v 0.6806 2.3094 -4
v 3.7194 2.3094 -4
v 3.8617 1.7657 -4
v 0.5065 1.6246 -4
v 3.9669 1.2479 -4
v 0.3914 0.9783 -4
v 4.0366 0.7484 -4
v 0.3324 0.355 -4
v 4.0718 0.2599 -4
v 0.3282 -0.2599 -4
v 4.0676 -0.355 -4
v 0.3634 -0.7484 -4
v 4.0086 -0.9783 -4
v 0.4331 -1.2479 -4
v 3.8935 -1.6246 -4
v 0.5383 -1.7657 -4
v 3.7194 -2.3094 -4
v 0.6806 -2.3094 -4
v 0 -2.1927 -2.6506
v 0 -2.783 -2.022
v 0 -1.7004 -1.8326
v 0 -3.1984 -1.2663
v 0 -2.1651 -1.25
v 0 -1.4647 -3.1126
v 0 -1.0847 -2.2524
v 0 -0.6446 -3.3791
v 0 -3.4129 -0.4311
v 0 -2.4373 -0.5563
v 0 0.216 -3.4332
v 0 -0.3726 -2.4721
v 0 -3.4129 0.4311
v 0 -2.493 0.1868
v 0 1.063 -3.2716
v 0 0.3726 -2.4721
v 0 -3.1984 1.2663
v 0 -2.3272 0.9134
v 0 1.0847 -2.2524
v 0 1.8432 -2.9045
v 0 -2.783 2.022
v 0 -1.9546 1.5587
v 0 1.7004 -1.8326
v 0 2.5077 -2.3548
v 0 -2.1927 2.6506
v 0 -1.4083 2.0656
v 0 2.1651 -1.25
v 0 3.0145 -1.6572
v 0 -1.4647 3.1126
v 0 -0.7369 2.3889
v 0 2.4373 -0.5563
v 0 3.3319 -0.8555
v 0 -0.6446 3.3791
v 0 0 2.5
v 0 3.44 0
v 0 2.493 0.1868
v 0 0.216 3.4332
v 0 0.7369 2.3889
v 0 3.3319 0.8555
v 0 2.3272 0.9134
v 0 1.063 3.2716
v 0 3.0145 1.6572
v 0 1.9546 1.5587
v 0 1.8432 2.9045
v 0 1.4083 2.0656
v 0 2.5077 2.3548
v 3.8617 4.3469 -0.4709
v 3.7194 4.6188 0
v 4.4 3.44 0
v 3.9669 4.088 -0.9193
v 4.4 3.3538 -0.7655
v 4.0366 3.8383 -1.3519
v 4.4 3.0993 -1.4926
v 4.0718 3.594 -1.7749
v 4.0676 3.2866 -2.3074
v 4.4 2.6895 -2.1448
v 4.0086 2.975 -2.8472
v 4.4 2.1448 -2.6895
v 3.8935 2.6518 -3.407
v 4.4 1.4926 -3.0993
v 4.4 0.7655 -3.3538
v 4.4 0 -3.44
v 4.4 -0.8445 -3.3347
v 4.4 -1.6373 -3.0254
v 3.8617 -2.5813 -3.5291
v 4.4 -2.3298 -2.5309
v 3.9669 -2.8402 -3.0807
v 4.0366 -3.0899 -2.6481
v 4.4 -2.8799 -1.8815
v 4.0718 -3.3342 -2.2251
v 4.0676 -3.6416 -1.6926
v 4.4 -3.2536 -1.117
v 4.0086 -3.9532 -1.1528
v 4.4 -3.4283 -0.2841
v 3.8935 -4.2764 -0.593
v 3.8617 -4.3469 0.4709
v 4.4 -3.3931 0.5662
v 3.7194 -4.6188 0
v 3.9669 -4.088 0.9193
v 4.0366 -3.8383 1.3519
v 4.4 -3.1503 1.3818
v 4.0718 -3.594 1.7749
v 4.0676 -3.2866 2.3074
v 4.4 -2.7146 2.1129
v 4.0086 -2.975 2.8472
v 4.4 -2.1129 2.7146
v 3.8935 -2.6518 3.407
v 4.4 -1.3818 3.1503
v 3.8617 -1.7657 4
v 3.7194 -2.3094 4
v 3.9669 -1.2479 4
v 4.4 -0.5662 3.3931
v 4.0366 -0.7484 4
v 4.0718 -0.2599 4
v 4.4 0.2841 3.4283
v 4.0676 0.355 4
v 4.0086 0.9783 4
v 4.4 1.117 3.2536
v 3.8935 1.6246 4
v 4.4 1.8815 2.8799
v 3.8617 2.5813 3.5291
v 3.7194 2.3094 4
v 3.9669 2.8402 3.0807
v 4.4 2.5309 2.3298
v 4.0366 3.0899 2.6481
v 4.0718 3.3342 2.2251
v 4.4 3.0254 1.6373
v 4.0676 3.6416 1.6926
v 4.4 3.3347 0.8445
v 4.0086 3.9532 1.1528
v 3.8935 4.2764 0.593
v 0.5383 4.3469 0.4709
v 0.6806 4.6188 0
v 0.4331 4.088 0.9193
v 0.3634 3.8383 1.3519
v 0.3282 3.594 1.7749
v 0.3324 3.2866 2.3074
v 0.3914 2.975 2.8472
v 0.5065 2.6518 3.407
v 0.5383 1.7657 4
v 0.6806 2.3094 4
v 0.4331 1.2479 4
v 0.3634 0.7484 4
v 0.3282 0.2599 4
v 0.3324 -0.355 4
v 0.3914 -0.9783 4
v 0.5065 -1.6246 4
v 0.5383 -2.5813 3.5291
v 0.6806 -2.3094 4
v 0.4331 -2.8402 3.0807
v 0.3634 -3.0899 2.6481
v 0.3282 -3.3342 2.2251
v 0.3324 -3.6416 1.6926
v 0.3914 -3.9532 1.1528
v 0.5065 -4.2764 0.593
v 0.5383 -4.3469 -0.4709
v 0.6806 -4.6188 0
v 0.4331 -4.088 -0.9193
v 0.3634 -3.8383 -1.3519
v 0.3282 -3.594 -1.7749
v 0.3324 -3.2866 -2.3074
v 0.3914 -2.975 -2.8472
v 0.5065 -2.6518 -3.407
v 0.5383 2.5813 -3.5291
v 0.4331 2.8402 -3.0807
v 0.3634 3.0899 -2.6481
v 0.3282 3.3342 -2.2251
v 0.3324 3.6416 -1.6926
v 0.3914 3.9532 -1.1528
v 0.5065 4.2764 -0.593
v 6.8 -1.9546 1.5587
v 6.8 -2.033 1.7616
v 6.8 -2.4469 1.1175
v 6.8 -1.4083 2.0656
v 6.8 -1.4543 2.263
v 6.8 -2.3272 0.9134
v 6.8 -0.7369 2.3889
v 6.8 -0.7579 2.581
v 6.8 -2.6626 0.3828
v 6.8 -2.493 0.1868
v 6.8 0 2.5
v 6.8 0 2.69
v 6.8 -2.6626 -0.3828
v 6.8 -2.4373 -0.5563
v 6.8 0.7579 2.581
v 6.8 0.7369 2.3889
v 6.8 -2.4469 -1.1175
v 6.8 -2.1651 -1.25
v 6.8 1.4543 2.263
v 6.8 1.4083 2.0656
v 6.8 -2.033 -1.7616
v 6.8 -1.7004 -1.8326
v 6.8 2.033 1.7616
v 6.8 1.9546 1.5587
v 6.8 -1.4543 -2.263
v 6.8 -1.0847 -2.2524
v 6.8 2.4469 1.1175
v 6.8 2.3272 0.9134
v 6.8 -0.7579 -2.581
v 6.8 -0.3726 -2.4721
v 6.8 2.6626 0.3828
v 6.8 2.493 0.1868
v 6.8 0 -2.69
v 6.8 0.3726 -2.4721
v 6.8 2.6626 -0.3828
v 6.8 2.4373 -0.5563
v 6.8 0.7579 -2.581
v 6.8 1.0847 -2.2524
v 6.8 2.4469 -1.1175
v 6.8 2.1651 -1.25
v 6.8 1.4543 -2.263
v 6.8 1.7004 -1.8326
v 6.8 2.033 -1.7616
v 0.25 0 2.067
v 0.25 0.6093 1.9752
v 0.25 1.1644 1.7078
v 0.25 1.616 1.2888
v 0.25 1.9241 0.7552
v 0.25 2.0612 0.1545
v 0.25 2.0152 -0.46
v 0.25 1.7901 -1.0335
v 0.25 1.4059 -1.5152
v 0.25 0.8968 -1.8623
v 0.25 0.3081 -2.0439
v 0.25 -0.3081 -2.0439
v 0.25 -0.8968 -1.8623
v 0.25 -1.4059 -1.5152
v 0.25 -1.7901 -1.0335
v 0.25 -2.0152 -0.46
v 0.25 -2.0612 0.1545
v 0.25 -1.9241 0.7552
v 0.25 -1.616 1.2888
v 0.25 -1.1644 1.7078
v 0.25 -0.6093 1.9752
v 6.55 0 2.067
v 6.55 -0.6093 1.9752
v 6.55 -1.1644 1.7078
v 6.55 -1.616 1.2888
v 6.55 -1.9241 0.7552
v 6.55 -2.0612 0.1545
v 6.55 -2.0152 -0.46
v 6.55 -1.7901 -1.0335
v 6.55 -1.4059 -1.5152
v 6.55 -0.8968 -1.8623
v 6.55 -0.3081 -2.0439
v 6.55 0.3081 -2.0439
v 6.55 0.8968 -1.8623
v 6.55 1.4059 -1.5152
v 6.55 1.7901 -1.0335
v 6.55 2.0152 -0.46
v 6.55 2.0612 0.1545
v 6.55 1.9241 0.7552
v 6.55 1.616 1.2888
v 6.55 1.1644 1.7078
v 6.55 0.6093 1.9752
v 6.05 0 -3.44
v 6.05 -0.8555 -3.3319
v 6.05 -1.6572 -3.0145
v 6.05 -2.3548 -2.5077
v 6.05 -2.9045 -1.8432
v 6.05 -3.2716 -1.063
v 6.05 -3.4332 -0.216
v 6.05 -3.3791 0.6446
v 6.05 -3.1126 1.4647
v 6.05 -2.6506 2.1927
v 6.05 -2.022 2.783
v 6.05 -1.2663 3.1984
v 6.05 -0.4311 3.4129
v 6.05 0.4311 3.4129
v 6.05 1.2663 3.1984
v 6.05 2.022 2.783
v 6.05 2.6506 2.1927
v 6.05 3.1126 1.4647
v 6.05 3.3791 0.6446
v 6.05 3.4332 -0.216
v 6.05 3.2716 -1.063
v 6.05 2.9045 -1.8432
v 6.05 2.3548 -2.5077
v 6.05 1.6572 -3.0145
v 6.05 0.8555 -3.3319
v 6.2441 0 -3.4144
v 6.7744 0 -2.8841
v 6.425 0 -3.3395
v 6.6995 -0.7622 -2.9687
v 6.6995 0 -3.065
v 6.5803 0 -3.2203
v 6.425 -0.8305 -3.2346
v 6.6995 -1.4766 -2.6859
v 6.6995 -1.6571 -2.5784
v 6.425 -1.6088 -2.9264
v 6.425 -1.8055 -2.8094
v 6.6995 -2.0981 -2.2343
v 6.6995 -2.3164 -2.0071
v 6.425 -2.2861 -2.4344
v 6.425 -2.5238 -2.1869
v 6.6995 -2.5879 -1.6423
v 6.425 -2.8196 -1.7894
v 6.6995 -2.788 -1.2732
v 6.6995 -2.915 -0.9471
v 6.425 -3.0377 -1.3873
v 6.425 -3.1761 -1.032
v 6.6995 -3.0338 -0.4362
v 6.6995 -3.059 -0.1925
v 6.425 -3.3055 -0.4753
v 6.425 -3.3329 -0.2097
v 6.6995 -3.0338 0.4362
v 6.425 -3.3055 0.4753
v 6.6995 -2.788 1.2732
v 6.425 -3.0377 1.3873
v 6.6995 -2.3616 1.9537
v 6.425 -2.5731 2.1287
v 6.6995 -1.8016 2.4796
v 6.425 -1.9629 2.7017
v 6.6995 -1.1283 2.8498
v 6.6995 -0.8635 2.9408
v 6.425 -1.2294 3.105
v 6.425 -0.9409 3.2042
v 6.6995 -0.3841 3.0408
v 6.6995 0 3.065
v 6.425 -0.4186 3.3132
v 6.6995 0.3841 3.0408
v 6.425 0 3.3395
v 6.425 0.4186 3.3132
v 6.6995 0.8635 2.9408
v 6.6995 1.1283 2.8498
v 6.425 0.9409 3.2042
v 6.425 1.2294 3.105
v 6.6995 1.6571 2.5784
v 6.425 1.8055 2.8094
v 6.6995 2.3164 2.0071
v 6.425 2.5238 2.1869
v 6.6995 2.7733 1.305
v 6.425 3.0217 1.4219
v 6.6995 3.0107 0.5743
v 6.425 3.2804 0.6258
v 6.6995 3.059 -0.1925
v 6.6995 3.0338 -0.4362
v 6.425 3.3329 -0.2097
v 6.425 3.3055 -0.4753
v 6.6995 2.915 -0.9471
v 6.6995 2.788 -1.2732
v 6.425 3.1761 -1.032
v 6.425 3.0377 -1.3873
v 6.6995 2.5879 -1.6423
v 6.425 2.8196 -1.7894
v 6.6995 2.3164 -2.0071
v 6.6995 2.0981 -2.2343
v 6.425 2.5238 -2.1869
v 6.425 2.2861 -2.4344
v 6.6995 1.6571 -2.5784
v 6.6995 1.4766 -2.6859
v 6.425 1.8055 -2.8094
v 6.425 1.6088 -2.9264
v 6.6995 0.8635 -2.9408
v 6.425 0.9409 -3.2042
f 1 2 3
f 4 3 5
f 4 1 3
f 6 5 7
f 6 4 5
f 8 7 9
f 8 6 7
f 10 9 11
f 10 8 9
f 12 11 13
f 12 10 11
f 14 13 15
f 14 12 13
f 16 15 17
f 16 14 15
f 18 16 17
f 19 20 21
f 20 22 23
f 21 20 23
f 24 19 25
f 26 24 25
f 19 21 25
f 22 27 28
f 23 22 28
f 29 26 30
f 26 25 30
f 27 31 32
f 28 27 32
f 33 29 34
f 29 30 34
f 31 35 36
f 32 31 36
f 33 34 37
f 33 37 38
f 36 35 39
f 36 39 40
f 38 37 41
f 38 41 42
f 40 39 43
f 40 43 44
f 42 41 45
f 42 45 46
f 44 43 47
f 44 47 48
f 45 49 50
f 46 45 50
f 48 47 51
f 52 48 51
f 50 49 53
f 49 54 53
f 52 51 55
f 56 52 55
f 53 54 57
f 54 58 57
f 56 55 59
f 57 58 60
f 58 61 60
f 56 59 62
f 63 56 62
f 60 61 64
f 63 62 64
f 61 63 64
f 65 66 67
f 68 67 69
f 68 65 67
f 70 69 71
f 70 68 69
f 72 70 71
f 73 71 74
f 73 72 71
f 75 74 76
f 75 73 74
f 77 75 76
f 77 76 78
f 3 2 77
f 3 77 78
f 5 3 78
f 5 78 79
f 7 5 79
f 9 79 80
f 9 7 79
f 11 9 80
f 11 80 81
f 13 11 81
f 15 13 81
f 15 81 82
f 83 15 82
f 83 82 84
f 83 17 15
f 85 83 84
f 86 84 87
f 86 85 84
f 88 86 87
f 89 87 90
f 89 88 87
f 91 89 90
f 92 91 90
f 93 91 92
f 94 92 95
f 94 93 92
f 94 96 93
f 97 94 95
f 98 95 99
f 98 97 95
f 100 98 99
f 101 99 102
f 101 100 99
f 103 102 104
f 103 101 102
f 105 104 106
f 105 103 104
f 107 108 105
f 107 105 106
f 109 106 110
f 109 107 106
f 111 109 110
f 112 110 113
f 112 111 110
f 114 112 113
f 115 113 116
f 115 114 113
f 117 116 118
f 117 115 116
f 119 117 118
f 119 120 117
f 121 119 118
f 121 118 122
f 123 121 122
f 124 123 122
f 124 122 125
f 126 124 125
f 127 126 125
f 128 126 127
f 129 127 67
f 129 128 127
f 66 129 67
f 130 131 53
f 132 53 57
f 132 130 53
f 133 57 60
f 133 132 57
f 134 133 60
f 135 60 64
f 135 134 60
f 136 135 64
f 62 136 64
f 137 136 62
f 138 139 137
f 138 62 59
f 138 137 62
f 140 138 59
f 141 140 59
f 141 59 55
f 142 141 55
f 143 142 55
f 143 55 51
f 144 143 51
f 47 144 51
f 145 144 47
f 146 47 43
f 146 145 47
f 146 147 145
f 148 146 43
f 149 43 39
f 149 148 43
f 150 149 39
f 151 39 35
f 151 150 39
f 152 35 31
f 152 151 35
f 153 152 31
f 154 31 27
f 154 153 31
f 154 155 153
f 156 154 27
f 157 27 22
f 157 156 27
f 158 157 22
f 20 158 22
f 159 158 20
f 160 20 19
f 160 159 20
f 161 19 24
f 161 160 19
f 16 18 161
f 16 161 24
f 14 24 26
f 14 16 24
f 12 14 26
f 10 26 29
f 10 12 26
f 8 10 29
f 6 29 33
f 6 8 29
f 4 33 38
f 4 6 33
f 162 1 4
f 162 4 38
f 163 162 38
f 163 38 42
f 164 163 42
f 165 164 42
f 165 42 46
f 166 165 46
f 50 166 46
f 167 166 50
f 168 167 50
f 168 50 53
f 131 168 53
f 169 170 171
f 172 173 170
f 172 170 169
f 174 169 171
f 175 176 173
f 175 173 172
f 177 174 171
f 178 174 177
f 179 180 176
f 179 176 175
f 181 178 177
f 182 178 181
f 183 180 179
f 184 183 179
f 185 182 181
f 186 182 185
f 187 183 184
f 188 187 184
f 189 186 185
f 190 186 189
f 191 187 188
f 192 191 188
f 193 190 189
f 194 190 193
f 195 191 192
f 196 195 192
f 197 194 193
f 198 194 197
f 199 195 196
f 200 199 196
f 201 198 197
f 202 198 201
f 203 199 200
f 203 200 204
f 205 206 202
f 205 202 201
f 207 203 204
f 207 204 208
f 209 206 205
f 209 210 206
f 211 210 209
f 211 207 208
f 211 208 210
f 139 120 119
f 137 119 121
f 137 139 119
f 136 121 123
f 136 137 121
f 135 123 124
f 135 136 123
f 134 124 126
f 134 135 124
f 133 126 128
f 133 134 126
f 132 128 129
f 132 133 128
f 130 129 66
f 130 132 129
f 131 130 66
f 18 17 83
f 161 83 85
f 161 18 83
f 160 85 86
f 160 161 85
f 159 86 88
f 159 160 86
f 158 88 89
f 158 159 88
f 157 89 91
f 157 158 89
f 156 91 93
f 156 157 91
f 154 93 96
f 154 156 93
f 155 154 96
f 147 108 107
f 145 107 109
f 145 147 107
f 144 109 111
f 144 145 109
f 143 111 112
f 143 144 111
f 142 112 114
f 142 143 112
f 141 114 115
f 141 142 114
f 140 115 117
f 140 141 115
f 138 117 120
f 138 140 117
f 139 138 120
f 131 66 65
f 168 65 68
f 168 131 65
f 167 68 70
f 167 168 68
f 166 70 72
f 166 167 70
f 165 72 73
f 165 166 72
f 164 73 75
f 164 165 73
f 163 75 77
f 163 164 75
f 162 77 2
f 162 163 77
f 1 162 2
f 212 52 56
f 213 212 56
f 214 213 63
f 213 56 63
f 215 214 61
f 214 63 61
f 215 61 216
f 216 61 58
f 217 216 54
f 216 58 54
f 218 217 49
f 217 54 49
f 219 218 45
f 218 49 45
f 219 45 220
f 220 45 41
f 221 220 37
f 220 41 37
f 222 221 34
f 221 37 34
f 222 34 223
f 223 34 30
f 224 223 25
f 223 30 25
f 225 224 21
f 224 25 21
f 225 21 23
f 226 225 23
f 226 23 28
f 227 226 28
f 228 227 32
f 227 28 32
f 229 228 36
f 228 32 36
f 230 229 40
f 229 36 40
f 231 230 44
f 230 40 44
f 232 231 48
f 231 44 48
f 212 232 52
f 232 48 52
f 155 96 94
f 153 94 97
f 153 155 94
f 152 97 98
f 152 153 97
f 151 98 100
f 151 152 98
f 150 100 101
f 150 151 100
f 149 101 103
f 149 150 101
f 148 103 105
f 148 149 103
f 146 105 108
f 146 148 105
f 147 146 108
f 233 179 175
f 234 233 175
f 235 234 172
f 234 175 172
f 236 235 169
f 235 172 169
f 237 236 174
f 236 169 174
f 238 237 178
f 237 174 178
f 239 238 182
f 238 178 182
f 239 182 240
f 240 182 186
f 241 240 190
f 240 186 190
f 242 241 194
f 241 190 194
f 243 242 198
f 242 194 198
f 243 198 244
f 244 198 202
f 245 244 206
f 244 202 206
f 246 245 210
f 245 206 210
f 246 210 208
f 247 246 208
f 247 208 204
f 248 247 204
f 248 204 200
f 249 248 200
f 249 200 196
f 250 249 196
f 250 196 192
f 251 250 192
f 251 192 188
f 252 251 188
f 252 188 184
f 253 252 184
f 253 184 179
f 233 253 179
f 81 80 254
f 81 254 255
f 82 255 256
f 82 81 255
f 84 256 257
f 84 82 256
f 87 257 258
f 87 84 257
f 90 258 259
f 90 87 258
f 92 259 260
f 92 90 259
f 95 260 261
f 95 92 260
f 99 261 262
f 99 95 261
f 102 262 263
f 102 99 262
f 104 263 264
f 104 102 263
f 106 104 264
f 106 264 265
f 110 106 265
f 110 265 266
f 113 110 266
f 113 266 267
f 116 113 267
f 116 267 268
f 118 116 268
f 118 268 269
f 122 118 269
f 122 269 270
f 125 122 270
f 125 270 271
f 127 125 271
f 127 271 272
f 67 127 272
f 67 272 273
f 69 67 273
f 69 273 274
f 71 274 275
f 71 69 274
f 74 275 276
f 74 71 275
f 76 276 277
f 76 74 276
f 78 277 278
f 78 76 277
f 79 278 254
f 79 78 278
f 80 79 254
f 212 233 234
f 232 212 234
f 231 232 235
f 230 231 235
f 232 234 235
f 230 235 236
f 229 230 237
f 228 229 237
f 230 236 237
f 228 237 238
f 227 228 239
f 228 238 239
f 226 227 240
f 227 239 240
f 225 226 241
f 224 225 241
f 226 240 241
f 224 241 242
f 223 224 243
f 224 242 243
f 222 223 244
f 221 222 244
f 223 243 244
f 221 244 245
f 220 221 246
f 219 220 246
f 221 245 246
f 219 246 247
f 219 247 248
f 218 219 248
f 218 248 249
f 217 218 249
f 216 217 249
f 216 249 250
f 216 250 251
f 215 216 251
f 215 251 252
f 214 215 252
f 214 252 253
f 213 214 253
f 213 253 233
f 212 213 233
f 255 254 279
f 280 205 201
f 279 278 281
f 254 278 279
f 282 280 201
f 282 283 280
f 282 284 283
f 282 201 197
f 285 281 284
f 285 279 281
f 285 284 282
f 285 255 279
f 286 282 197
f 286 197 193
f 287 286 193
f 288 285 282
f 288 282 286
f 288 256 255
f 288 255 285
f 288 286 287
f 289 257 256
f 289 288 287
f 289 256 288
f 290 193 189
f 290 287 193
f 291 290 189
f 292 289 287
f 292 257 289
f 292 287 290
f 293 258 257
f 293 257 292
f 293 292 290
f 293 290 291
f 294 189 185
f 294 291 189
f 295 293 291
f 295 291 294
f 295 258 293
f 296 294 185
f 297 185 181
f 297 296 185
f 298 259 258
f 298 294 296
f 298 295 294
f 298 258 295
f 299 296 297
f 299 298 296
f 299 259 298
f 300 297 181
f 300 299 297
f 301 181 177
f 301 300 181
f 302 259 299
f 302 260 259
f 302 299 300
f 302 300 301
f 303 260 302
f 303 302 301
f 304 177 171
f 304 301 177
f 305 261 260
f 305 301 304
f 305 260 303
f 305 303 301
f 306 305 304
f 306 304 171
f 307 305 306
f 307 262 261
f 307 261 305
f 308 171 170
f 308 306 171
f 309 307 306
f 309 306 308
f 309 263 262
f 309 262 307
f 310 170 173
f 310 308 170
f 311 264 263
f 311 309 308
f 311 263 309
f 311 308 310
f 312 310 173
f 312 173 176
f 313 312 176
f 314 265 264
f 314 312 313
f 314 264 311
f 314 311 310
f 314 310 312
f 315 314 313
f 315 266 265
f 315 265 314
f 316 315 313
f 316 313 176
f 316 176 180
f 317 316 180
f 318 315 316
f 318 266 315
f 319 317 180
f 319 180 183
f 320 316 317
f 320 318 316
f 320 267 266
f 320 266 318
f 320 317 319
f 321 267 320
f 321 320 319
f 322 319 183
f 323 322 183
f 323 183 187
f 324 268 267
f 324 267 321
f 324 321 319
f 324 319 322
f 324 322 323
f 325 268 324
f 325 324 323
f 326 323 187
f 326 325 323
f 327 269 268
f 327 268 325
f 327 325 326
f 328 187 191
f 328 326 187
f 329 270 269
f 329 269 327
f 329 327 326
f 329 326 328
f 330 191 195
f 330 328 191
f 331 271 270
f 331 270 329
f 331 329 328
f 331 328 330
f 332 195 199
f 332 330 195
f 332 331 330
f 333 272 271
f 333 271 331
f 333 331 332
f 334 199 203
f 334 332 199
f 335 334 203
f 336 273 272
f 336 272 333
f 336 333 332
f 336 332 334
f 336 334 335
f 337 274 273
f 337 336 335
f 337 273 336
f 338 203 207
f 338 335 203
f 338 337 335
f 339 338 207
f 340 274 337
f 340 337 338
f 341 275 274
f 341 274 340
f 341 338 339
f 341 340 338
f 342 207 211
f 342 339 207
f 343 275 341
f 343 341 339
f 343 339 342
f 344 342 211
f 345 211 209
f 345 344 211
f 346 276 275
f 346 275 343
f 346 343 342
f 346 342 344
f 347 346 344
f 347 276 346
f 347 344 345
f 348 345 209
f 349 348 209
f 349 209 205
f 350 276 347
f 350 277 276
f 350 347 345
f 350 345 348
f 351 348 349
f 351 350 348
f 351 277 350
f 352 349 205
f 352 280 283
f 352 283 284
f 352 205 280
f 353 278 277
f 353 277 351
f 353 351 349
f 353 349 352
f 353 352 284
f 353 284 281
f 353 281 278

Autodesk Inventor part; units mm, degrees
ref_plane "YZ Plane" through (0, 0, 0) normal (1, 0, 0) x (0, 1, 0)
ref_plane "XZ Plane" through (0, 0, 0) normal (0, 1, 0) x (-1, 0, 0)
sketch "Sketch1" plane through (0, 0, 0) normal (1, 0, 0) x (0, 1, 0)
  line L0 (2.3094, -4) -> (-2.3094, -4)
  line L1 (-2.3094, -4) -> (-4.6188, 0)
  line L2 (-4.6188, 0) -> (-2.3094, 4)
  line L3 (-2.3094, 4) -> (2.3094, 4)
  line L4 (2.3094, 4) -> (4.6188, 0)
  line L5 (4.6188, 0) -> (2.3094, -4)
  point P0 (0, 0)
  point P1 (0, 0)
  dimension "d0" = 9.2376
extrude "Body" add sketch "Sketch1" along normal blind 4.4
sketch "Sketch2" plane through (4.4, 0, 0) normal (1, 0, 0) x (0, 0, -1)
  circle A0 centre (0, 0) radius 3.44
  dimension "d7" = 6.88
extrude "Ring" add sketch "Sketch2" along normal blind 2.4
sketch "Sketch3" plane through (0, 0, 0) normal (0, 0, 1) x (1, 0, 0)
  line L0 (0, 2.3094) -> (0, 4.6188) projected
  line L1 (0, 4.6188) -> (4.4, 4.6188) projected
  line L2 (4.4, 2.3094) -> (4.4, 4.6188) projected
  line L3 (-0.88, 0) -> (5.28, 0) projected
  line L4 (0, 3.44) -> (0.6806, 4.6188)
  line L5 (3.7194, 4.6188) -> (4.4, 3.44)
  dimension "d3" = 30
  dimension "d4" = 30
  dimension "d5" = 6.88
  dimension "d6" = 6.88
revolve "Chamfer1" cut sketch "Sketch3" angle 360 about axis through (-10, 0, 0) along (1, 0, 0)
sketch "Sketch4" plane through (0, 0, 0) normal (-1, 0, 0) x (0, 0, 1)
  line L0 (0, -6.4663) -> (0, 6.4663) projected
  line L1 (-5.6, 0) -> (5.6, 0) projected
  point P0 (0, 0)
hole "Thread" at (0, 0, 0) direction (1, 0, 0) diameter 4.134 end through all thread size "M5x0.8" designation "M5" class "6H" standard "ISO Metric profile"
chamfer "Chamfer2" distance 0.433 angle 30 1 edges at (0, 0, -2.067) measured on face at (0, 2.944, -0.3575)
chamfer "Chamfer3" distance 0.433 angle 30 1 edges at (6.8, 0, -2.067) measured on face at (6.8, -0.2744, -2.949)
ref_plane "Work Plane1" through (13.9848, 0, 0) normal (0, 0, 1) x (-1, 0, 0)
fillet "Fillet1" radius 0.75 1 edges at (6.8, 0, 3.44)
equation "\"d0\" = 1.1547 * SW"
equation "\"d1\" = KOH1"
equation "\"d7\" = SD2"
equation "\"d8\" = KOH - KOH1"
equation "\"d3\" = ANG1"
equation "\"d4\" = ANG2"
equation "\"d5\" = SW0"
equation "\"d6\" = SW01"
equation "\"d10\" = -0.5 * GD1 + 0.5 * NND"
equation "\"d46\" = -0.5 * GD1 + 0.5 * NND"
equation "\"d12\" = -0.5 * GD1 + 0.5 * NND"
equation "\"d47\" = -0.5 * GD1 + 0.5 * NND"
equation "\"ANG1\" = 30deg"
equation "\"ANG2\" = 30deg"
equation "\"NND\" = 5"
equation "\"KOH1\" = 4.4"
equation "\"KOH\" = 6.8"
equation "\"SW\" = 8"
equation "\"SW0\" = 6.88"
equation "\"SW01\" = SW0"
equation "\"SD2\" = SW0"
equation "\"GUL\" = 0.541266 * PTC"
equation "\"THREADDIA\" = 5"
equation "\"TOA\" = 30deg"
equation "\"PTC\" = 0.8"
equation "\"E0\" = 1.155 * SW"
equation "\"GAL\" = 0.541266 * PTC"
equation "\"GD1\" = 4.133975"
properties part number "ISO 7040 - M5" material "Steel"
